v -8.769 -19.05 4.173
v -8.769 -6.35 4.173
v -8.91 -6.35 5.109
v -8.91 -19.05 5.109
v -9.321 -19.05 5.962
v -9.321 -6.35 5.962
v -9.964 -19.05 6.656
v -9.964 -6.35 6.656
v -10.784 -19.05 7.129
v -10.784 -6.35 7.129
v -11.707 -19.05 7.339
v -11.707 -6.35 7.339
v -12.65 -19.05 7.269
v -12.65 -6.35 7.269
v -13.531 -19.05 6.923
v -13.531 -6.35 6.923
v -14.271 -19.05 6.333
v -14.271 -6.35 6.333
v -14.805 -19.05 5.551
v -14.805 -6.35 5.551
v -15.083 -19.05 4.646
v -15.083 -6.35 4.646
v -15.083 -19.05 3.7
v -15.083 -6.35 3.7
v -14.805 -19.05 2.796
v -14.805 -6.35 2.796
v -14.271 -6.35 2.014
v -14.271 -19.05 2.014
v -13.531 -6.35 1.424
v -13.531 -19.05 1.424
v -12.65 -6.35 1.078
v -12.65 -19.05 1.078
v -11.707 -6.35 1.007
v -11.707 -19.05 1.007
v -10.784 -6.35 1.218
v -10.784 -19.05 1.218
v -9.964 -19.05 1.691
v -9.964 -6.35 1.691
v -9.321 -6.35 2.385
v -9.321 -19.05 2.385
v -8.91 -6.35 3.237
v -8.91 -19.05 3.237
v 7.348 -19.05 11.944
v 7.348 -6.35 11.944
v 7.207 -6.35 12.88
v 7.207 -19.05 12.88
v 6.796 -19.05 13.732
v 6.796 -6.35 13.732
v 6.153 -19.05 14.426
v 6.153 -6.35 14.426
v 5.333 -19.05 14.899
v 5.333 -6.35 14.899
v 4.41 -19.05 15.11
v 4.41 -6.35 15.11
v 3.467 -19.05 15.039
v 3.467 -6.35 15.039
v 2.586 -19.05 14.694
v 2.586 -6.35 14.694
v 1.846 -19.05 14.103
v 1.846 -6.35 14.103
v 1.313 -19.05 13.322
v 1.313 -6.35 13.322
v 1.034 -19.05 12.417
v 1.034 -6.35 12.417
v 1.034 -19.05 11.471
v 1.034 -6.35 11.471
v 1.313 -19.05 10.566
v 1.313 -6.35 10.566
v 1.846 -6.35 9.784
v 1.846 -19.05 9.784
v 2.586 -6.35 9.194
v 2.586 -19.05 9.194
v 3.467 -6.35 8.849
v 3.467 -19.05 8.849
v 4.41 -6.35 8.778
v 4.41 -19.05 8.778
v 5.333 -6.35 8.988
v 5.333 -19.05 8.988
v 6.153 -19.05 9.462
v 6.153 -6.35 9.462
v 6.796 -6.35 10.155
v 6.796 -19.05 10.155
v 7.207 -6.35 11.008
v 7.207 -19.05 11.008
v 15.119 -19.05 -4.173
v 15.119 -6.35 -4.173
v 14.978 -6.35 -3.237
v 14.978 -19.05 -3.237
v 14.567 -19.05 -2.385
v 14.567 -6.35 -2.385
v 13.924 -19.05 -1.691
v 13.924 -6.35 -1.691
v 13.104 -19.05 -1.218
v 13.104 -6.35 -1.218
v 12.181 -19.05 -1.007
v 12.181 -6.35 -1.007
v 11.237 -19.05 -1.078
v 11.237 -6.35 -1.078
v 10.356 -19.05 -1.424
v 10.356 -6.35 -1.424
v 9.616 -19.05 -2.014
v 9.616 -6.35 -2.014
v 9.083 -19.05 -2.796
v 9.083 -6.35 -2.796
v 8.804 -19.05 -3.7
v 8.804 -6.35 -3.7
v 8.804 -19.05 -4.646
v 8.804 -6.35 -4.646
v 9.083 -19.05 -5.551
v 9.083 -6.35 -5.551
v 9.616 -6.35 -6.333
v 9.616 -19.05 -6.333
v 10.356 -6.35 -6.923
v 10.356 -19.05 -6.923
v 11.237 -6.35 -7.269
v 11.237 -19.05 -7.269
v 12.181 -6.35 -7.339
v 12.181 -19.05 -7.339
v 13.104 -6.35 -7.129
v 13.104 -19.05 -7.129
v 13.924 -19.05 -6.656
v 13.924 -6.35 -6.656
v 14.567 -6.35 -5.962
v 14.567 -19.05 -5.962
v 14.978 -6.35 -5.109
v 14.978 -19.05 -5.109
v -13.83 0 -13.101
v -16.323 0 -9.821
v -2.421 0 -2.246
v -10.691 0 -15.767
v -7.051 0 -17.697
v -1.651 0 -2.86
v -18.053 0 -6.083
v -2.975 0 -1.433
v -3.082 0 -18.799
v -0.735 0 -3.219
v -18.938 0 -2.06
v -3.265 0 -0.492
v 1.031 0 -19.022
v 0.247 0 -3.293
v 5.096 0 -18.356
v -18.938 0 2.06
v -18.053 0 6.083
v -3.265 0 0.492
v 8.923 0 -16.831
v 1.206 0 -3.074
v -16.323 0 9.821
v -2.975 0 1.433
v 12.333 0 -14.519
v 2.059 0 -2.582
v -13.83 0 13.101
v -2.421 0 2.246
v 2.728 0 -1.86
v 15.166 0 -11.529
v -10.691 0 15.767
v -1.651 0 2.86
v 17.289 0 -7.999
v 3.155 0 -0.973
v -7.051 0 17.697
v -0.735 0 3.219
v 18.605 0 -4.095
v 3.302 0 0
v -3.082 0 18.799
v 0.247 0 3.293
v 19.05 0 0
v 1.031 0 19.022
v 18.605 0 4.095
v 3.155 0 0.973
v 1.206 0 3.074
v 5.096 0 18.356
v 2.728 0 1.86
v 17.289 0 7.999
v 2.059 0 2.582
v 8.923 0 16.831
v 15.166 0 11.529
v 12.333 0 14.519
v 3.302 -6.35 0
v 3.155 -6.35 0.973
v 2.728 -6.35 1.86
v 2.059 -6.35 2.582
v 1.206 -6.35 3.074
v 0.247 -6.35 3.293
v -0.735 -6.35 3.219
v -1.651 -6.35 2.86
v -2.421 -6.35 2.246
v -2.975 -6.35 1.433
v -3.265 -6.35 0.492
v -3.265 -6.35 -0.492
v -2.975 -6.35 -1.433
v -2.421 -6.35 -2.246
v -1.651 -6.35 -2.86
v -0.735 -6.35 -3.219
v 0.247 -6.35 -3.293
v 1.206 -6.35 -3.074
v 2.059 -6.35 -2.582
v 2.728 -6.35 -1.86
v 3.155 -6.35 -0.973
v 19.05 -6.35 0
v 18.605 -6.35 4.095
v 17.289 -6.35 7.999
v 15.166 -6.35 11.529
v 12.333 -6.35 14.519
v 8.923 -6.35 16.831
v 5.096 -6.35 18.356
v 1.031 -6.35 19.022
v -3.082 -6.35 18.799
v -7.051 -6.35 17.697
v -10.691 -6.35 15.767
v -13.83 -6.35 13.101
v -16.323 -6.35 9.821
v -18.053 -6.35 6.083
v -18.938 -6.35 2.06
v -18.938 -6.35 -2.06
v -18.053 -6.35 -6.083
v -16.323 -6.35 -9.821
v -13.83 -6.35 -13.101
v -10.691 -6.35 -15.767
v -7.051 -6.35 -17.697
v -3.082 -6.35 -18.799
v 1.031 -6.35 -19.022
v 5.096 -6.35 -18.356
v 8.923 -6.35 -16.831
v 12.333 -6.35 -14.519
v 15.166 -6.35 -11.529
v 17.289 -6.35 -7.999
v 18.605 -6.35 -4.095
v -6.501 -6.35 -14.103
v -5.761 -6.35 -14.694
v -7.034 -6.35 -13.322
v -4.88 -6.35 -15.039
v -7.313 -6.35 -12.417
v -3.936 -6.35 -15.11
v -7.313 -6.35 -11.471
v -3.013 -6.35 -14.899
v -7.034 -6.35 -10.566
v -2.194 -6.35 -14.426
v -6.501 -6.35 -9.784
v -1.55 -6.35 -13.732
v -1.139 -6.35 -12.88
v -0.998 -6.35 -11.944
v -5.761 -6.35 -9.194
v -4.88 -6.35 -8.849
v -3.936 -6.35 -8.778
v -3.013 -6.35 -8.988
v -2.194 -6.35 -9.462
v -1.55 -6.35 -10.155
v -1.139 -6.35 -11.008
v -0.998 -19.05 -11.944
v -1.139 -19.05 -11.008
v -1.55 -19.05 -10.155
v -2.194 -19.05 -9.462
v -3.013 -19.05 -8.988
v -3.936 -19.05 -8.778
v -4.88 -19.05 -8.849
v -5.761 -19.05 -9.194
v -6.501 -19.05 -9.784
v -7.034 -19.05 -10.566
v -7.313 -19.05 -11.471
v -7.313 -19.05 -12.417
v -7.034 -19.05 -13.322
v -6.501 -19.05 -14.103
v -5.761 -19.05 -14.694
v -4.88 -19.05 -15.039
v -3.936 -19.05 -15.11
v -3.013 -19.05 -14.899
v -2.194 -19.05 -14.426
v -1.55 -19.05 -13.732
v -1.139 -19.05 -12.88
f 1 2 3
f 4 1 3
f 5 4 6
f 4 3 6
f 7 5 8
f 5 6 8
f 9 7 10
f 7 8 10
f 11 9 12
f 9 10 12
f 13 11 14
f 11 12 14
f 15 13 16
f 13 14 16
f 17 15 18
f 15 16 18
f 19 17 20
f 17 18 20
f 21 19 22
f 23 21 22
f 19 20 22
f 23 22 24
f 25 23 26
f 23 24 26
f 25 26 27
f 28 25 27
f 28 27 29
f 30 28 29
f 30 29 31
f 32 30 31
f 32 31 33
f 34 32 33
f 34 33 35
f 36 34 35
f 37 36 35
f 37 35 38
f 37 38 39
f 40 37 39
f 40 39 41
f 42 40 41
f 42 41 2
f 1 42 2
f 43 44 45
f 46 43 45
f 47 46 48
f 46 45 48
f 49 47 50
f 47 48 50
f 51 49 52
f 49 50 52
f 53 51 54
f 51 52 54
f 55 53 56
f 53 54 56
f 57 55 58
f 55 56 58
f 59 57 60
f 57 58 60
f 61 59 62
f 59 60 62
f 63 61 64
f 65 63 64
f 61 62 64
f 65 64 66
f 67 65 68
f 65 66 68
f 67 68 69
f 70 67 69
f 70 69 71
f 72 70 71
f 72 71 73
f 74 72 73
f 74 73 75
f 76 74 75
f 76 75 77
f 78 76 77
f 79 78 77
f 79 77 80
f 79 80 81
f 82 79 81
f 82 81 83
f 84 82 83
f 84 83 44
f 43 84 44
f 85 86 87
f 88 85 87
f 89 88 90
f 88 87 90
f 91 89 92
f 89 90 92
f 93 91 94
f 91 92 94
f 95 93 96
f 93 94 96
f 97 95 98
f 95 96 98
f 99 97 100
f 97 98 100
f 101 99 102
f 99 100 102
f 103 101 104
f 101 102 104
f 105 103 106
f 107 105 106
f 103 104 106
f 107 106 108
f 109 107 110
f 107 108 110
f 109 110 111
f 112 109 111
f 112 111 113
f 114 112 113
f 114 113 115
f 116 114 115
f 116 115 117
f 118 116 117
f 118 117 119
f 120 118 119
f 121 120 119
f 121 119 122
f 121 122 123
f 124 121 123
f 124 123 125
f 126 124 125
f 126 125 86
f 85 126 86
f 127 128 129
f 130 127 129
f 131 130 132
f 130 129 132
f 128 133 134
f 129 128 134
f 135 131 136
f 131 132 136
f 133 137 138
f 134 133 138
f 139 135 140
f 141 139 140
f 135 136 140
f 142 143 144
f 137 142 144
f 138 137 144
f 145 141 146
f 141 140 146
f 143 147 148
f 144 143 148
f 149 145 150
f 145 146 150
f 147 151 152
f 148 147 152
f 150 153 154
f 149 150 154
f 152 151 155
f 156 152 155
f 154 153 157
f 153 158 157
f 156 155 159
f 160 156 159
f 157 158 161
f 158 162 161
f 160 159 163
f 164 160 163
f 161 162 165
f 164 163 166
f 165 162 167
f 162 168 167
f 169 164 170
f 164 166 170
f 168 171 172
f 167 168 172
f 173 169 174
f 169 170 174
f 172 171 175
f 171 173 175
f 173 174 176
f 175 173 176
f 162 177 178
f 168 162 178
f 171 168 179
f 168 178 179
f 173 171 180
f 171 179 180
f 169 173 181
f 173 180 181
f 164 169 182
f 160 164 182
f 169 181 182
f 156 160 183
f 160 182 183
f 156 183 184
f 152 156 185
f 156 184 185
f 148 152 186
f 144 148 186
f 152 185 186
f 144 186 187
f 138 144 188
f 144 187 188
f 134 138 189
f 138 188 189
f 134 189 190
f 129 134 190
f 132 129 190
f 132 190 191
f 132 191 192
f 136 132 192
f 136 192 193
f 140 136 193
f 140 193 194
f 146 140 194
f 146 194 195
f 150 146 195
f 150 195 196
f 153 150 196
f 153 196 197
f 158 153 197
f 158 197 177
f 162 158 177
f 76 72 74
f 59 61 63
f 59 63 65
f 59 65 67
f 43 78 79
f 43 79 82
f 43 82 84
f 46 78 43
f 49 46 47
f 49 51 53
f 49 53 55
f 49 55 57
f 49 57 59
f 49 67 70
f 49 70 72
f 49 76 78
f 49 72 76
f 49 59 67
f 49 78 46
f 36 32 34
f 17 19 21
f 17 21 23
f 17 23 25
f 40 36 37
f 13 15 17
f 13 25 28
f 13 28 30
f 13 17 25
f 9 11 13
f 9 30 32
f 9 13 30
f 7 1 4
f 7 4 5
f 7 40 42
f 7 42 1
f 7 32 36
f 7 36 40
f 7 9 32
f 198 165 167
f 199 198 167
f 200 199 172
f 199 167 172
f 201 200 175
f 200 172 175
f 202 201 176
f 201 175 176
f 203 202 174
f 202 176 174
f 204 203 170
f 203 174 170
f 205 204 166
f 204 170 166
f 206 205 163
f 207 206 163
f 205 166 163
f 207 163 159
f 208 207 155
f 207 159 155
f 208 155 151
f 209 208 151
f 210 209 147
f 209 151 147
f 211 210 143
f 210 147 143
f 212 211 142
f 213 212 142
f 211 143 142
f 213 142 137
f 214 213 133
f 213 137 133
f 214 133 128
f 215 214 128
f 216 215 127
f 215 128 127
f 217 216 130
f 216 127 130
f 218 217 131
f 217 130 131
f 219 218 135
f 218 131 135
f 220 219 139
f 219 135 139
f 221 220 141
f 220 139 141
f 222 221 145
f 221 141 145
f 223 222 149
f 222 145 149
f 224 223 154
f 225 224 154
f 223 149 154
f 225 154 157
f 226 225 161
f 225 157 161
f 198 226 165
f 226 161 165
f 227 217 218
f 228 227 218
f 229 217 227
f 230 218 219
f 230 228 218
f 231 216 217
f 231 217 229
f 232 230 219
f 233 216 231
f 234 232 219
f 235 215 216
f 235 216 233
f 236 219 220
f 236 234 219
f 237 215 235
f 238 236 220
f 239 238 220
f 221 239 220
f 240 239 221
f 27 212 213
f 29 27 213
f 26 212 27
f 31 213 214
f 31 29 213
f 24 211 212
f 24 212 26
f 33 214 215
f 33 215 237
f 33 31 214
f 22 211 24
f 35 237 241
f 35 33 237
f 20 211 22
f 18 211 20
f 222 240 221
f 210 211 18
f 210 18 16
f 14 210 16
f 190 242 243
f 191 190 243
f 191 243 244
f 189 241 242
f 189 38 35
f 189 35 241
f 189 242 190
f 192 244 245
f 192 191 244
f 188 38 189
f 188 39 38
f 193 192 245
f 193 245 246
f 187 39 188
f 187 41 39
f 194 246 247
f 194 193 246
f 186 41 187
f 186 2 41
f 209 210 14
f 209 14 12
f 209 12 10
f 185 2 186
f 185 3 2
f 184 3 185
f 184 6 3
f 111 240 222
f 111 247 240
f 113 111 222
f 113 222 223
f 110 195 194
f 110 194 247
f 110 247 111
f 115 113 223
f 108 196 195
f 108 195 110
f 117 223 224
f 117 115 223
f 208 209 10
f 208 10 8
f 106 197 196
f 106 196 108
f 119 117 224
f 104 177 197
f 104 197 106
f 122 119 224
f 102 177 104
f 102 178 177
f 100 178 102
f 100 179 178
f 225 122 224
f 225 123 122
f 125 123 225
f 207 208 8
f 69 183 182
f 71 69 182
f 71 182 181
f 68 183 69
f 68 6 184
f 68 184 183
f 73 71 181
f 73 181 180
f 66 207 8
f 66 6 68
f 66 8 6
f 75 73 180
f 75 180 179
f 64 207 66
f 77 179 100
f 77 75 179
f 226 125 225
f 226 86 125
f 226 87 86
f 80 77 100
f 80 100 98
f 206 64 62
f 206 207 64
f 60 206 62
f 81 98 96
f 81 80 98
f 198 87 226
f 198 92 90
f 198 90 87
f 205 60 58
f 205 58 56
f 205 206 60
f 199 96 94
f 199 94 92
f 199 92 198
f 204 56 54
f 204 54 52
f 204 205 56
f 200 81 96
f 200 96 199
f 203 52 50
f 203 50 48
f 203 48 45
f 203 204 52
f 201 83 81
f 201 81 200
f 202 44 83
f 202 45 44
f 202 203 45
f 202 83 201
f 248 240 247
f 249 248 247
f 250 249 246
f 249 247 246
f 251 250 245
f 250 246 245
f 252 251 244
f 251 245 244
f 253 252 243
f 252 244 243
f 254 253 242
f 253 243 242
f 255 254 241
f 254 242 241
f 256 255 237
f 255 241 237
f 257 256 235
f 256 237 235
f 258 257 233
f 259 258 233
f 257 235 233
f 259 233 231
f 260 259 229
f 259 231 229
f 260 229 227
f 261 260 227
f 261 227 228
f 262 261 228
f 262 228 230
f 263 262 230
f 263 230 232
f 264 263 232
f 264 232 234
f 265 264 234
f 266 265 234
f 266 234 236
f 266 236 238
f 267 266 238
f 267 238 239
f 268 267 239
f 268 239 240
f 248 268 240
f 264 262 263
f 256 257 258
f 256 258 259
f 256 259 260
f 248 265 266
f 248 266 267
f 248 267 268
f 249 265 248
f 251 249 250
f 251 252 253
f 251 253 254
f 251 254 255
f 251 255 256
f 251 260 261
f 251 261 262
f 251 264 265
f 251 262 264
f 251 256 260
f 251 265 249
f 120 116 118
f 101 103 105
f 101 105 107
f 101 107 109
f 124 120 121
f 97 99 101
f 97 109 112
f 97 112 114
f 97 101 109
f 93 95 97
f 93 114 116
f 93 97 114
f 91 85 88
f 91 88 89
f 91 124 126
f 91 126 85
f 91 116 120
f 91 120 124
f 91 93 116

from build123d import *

# Parameters (mm, degrees)
F0_R     = 19.05
F2_DEPTH = 6.35
F1_R     = 3.175
F3_DEPTH = 19.05
F4_R     = 3.302
F5_DEPTH = 25.4


with BuildPart() as f2:
    # F0 (on Front) → F2 (new body)
    with BuildSketch(Plane.XZ):
        Circle(F0_R)
    extrude(amount=F2_DEPTH)

    # F1 (on Front) → F3 (join)
    with BuildSketch(Plane.XZ):
        with Locations((4.173186, 11.943939)):
            Circle(F1_R)
        with Locations((-11.943939, 4.173186)):
            Circle(F1_R)
        with Locations((-4.173186, -11.943939)):
            Circle(F1_R)
        with Locations((11.943939, -4.173186)):
            Circle(F1_R)
    extrude(amount=F3_DEPTH)

    # F4 (on face) → F5 (cut)
    with BuildSketch(Plane.XZ.offset(6.35)):
        Circle(F4_R)
    extrude(amount=-F5_DEPTH, mode=Mode.SUBTRACT)


solid = f2.part
